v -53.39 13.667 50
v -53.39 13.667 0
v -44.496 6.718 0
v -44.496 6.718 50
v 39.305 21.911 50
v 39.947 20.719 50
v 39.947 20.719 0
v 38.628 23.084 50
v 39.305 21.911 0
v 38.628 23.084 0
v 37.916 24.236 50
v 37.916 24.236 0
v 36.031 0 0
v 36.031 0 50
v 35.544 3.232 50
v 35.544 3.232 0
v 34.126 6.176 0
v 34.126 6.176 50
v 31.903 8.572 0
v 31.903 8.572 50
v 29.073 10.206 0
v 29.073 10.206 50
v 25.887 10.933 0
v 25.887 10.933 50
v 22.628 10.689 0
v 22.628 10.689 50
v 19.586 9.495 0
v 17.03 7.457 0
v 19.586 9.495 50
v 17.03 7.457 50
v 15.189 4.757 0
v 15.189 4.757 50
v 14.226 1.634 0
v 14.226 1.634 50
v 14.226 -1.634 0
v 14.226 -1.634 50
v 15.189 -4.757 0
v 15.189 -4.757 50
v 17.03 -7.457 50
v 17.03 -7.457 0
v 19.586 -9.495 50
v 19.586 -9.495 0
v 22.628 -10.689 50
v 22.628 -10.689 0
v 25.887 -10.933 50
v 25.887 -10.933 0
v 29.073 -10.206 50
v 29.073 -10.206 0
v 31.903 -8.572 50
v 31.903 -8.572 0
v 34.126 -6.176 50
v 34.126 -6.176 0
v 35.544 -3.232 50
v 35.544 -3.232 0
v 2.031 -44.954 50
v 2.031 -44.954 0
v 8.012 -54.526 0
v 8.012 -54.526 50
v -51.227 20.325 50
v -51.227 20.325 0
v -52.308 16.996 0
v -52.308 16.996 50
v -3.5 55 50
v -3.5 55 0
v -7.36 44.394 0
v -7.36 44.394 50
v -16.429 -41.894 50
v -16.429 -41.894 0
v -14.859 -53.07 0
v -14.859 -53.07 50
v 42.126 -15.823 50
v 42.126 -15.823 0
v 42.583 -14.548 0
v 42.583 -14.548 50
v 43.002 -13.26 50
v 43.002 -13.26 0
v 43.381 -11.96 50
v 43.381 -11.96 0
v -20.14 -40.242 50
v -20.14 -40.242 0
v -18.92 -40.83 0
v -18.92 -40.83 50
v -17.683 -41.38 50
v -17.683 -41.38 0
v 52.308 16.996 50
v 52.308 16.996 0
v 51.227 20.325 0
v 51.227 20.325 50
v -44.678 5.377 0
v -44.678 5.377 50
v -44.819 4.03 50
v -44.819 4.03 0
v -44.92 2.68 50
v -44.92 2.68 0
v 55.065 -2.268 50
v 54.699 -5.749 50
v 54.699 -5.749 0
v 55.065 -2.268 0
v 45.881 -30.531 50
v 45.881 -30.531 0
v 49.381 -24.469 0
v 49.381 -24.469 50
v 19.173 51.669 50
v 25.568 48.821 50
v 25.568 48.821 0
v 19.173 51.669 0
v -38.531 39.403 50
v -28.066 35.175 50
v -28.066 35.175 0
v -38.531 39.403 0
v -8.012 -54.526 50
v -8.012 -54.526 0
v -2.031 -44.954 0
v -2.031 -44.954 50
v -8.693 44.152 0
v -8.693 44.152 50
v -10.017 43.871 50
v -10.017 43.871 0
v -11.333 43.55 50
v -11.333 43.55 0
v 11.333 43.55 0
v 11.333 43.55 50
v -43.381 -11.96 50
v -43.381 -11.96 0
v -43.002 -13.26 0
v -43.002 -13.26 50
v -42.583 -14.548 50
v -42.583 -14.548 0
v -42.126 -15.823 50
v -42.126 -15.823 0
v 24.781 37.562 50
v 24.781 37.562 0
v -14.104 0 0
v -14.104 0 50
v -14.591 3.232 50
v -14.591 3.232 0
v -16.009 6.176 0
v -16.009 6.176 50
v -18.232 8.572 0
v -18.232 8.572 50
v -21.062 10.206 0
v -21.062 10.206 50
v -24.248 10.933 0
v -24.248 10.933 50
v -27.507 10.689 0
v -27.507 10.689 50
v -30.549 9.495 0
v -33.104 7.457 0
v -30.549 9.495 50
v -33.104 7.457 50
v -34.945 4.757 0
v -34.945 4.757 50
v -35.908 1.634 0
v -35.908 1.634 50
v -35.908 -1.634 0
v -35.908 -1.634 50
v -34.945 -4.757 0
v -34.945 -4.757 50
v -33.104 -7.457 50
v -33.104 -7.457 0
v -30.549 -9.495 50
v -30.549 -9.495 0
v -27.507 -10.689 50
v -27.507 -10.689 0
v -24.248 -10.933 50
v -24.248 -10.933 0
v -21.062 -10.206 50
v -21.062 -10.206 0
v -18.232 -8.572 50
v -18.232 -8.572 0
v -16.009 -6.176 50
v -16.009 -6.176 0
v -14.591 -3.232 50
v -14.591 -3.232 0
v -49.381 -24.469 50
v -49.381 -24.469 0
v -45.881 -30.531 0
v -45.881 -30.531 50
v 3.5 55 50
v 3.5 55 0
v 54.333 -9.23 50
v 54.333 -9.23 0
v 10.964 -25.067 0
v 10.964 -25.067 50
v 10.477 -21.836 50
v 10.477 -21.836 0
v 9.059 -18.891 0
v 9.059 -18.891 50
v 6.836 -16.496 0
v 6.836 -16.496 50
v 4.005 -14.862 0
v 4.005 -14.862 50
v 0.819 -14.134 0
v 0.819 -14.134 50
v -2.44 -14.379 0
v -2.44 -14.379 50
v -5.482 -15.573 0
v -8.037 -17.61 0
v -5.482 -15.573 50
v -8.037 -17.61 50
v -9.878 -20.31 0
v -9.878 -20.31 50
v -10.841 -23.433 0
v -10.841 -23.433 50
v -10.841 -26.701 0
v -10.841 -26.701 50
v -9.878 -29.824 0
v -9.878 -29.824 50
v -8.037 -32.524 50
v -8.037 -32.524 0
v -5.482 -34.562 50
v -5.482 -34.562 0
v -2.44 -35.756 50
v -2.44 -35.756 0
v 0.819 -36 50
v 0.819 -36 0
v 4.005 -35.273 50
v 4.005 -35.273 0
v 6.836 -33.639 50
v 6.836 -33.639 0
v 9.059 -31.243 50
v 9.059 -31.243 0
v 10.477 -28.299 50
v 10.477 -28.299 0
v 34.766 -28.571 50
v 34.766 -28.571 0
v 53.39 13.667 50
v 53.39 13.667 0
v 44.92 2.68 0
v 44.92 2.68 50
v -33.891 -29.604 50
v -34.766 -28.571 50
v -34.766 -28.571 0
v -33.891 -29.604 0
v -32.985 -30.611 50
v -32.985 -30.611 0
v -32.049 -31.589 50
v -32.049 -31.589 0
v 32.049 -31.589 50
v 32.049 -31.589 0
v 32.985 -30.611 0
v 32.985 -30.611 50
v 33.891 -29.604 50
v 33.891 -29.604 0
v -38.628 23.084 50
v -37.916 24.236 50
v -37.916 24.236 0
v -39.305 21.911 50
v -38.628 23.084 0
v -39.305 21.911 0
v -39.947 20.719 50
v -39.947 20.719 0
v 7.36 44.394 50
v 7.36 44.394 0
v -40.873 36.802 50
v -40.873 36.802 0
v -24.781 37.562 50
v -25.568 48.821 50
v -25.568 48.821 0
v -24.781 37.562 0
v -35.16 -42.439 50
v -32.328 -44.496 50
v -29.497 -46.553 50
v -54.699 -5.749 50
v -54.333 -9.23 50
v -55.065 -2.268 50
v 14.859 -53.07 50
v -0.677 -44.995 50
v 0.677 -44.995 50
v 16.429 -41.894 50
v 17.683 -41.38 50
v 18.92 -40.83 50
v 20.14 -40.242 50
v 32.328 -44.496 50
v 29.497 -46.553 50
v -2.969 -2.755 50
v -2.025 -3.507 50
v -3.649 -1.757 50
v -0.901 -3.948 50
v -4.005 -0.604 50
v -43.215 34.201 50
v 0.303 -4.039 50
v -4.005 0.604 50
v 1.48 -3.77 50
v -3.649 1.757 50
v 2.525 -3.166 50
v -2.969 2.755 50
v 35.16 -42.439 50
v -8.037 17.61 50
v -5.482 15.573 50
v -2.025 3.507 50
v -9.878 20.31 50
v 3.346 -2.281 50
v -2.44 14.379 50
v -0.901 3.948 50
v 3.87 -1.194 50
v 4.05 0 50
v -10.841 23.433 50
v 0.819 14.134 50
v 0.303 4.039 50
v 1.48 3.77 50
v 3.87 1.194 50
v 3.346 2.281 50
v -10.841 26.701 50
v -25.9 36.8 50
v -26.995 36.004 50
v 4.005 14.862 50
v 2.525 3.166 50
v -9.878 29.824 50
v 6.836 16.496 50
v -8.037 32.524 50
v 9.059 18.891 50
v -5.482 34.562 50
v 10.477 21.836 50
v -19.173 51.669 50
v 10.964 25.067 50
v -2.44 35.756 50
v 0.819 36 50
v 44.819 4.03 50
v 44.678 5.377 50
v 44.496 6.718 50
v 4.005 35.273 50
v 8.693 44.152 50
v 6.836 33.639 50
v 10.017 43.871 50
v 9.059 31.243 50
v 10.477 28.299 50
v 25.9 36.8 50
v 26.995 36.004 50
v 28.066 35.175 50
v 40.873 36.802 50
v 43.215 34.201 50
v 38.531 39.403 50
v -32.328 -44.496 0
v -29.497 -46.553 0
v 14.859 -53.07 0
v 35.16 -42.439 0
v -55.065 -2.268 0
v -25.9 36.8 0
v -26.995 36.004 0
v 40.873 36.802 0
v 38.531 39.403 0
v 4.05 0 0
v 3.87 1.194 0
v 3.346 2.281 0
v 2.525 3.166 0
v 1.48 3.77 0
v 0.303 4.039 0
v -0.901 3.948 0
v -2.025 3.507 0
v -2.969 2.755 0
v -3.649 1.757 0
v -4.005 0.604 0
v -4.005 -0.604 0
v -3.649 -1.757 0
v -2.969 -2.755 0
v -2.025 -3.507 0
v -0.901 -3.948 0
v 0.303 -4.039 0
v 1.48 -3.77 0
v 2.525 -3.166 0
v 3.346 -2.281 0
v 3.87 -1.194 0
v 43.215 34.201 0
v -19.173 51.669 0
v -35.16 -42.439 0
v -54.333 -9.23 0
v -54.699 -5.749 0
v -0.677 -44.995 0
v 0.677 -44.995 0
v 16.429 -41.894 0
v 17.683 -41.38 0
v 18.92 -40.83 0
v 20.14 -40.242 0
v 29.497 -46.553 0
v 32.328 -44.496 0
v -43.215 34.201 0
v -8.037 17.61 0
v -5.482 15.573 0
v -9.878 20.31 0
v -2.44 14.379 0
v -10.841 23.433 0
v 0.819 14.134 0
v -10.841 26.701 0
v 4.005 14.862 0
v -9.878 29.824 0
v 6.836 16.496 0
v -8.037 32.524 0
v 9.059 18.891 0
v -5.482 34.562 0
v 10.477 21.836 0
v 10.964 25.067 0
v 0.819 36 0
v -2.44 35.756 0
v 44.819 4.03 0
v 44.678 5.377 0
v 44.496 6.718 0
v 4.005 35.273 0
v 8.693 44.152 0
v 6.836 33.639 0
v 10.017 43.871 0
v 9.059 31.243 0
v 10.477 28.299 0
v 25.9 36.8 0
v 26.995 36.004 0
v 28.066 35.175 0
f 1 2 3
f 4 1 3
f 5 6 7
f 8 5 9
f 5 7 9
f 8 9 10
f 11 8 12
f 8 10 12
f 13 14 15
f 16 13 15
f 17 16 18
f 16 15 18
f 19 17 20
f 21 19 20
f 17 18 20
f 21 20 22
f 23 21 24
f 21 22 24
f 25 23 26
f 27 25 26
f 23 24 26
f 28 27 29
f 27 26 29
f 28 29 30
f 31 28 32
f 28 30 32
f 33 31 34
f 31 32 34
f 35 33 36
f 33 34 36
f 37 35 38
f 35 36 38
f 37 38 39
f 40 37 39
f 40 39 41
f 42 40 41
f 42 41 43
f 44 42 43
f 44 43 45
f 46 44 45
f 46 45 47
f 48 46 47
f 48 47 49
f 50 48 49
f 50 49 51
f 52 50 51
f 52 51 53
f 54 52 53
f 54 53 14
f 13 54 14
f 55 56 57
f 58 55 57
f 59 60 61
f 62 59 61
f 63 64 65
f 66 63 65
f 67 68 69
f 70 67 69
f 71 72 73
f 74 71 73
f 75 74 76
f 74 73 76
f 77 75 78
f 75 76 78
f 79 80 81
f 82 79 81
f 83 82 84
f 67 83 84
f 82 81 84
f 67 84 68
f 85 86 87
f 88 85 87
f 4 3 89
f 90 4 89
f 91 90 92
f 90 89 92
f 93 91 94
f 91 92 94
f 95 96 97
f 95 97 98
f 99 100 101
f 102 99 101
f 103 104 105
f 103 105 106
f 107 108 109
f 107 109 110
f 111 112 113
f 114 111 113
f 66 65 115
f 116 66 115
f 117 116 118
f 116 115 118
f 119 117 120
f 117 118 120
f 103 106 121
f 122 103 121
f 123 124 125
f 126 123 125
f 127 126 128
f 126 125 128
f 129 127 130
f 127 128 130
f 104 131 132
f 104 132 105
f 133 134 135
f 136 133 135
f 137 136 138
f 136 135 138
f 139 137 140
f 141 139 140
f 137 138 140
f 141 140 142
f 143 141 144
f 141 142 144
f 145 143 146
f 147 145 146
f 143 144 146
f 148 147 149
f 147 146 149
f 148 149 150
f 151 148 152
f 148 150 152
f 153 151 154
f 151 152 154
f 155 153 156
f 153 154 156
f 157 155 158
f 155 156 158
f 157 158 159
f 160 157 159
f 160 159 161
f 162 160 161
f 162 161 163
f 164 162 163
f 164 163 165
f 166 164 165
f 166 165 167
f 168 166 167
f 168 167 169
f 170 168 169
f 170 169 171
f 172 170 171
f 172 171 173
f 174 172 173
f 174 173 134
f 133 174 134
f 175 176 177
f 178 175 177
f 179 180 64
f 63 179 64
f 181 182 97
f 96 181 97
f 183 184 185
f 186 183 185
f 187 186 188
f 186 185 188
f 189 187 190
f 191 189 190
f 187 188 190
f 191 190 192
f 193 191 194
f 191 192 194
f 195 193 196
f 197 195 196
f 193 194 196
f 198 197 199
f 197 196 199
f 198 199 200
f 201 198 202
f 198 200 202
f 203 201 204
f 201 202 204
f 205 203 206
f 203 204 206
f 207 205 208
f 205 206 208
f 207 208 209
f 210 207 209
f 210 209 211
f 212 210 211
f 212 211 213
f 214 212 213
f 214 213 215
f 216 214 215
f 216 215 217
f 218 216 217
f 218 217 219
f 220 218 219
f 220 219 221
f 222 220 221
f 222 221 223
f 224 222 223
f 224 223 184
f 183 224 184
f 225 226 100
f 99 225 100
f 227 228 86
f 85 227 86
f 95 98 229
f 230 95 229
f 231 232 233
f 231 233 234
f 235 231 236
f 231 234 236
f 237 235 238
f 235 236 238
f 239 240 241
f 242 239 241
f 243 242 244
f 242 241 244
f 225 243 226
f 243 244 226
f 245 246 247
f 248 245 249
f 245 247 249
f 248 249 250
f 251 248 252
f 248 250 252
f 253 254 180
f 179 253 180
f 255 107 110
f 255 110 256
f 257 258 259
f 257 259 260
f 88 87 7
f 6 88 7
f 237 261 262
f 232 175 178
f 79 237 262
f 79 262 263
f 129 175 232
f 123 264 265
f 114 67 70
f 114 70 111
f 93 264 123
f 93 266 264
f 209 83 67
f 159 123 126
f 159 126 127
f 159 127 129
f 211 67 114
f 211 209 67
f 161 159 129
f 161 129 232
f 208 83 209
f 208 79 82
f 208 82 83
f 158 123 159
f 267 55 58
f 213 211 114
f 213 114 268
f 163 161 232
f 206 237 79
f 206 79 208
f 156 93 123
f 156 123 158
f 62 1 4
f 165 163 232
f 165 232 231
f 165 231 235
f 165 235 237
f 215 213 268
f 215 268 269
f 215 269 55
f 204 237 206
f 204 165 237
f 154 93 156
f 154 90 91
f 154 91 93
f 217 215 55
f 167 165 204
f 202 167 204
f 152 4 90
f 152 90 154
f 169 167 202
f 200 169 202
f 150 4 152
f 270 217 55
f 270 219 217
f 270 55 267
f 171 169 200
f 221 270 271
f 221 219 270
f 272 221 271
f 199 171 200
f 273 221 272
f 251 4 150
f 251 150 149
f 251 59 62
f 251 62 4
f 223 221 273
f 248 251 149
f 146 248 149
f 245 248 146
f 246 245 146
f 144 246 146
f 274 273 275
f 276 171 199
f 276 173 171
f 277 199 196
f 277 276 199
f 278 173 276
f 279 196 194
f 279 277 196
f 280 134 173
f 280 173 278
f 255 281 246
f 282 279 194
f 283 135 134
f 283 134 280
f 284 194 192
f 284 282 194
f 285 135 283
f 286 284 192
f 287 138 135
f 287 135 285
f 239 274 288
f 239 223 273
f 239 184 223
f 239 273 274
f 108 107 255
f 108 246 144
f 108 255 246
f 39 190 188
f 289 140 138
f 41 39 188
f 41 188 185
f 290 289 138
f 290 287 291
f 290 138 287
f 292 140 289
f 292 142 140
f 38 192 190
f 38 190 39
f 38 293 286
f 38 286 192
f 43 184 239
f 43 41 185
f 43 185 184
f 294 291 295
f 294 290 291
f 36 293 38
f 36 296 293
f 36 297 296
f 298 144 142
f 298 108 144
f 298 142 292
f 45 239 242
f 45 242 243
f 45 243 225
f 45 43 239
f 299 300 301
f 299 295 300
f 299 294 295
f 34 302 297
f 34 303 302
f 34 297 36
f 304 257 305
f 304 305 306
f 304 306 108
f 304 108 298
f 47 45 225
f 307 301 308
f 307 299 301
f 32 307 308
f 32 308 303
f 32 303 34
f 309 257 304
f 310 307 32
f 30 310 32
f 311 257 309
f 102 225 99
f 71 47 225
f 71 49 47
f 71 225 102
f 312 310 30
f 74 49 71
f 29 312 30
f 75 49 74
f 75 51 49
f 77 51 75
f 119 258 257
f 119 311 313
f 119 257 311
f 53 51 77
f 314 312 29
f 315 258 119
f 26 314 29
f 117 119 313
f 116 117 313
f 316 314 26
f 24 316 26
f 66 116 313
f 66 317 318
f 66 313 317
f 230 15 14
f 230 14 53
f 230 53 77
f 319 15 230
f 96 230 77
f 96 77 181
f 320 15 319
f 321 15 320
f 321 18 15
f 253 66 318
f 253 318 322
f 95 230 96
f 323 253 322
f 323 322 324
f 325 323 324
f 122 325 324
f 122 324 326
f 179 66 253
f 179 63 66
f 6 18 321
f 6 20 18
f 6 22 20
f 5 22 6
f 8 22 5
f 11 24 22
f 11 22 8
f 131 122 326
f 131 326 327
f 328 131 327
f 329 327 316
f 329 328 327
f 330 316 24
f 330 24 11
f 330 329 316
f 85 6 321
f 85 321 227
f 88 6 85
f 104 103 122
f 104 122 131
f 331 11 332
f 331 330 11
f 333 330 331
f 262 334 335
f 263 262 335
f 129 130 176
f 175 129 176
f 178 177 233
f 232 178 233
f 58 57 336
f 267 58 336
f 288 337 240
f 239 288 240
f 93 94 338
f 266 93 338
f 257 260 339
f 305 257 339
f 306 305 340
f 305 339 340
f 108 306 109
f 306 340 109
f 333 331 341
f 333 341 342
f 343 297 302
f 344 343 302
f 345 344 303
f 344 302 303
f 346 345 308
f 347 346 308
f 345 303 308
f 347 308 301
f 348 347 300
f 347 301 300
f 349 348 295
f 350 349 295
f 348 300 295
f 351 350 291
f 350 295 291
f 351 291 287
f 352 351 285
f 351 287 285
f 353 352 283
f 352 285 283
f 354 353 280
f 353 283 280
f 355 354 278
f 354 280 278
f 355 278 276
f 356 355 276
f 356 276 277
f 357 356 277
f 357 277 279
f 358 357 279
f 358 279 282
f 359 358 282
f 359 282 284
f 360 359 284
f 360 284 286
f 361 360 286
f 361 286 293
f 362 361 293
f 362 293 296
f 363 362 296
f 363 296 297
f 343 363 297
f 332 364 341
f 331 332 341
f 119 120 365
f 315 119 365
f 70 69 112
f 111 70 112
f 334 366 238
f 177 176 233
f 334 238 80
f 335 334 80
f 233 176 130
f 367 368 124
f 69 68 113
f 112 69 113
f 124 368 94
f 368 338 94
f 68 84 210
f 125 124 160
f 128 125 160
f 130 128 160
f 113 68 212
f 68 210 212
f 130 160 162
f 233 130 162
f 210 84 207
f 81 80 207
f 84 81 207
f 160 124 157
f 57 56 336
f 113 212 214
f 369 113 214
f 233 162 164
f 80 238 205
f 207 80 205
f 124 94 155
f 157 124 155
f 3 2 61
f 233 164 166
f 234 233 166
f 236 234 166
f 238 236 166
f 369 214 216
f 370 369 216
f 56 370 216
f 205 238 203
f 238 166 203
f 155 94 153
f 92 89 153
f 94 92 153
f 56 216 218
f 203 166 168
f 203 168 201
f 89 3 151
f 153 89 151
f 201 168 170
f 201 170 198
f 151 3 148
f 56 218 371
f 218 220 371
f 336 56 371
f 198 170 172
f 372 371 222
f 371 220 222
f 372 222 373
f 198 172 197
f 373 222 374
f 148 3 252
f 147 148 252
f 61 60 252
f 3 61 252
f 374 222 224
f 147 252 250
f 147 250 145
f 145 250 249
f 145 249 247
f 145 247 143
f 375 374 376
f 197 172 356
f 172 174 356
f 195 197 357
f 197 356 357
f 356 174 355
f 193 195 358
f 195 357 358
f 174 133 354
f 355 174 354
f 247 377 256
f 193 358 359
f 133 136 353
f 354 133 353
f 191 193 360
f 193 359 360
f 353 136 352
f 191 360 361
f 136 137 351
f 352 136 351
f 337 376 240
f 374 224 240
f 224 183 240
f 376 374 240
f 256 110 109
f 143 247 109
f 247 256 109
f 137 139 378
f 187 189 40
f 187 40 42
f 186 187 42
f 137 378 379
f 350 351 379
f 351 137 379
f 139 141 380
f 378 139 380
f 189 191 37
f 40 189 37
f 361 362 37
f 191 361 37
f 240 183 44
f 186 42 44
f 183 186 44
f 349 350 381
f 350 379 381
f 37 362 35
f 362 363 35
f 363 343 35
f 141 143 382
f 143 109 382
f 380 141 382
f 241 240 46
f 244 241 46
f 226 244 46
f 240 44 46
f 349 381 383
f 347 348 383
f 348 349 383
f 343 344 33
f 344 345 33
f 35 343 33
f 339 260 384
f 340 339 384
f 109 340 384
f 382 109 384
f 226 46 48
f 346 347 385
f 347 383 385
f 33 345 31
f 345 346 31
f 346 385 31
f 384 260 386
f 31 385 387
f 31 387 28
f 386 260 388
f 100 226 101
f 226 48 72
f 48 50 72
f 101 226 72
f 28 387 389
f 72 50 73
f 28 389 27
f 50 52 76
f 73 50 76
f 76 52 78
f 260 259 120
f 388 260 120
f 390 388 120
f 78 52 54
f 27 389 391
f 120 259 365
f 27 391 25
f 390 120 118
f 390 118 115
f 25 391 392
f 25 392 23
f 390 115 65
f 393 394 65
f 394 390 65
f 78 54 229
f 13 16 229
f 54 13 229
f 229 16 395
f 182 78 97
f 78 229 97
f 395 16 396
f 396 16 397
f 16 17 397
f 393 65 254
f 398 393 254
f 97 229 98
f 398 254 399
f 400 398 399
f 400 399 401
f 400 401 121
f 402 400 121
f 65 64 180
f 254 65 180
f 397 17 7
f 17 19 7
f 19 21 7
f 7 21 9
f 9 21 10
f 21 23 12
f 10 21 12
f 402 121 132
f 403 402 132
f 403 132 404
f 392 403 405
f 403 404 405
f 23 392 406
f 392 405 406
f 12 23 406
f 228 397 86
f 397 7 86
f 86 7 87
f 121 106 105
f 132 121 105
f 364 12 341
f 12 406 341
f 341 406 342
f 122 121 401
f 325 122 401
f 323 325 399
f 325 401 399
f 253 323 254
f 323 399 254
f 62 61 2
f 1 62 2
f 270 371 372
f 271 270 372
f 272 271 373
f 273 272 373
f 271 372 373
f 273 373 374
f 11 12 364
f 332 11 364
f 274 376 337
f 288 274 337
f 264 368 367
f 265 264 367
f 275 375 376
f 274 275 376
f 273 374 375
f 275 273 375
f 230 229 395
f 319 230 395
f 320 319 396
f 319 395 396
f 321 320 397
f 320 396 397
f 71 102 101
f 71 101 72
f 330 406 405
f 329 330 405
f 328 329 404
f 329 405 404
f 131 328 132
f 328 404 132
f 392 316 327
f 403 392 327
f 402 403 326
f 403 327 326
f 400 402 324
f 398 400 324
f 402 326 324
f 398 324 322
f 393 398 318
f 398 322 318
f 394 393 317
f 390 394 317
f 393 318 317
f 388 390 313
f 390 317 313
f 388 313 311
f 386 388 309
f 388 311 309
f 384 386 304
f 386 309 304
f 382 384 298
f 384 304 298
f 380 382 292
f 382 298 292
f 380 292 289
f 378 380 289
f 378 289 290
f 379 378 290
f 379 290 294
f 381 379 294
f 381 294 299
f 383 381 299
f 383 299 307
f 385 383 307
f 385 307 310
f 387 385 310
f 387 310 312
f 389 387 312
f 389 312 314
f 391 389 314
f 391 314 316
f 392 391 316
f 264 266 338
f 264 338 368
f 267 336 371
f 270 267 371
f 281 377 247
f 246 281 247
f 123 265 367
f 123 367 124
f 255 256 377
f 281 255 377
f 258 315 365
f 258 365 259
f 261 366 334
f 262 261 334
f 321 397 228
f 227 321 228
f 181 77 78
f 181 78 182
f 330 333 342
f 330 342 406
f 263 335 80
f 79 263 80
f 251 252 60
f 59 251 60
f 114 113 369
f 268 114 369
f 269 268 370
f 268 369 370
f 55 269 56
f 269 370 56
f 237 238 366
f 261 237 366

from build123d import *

# Parameters (mm, degrees)
F0_R     = 4.05
F1_DEPTH = 50
F2_R     = 10.963605
F2_R_2   = 4.05
F3_DEPTH = 100


with BuildPart() as f1:
    # F0 (on Top) → F1 (new body)
    with BuildSketch(Plane.XY):
        with BuildLine():
            Line((14.85866, -53.070427), (16.429462, -41.893589))
            ThreePointArc((16.429462, -41.893589), (9.356026, -44.016642), (2.030598, -44.954162))
            Line((2.030598, -44.954162), (8.011626, -54.525809))
            Line((8.011626, -54.525809), (11.435143, -53.798118))
            Line((11.435143, -53.798118), (14.85866, -53.070427))
        make_face()
        with BuildLine():
            Line((-8.011626, -54.525809), (-2.030598, -44.954162))
            ThreePointArc((-2.030598, -44.954162), (-9.356026, -44.016642), (-16.429462, -41.893589))
            Line((-16.429462, -41.893589), (-14.85866, -53.070427))
            Line((-14.85866, -53.070427), (-11.435143, -53.798118))
            Line((-11.435143, -53.798118), (-8.011626, -54.525809))
        make_face()
        with BuildLine():
            Line((-29.496629, -46.553183), (-20.139548, -40.241752))
            ThreePointArc((-20.139548, -40.241752), (-26.450336, -36.405765), (-32.048718, -31.589234))
            Line((-32.048718, -31.589234), (-35.159748, -42.438686))
            Line((-35.159748, -42.438686), (-32.328189, -44.495935))
            Line((-32.328189, -44.495935), (-29.496629, -46.553183))
        make_face()
        with BuildLine():
            Line((-45.881397, -30.531089), (-34.766188, -28.571178))
            ThreePointArc((-34.766188, -28.571178), (-38.971143, -22.5), (-42.126459, -15.822813))
            Line((-42.126459, -15.822813), (-49.381397, -24.468911))
            Line((-49.381397, -24.468911), (-47.631397, -27.5))
            Line((-47.631397, -27.5), (-45.881397, -30.531089))
        make_face()
        with BuildLine():
            Line((-54.332855, -9.229892), (-43.381438, -11.960387))
            ThreePointArc((-43.381438, -11.960387), (-44.753485, -4.703781), (-44.920154, 2.679516))
            Line((-44.920154, 2.679516), (-55.064554, -2.268239))
            Line((-55.064554, -2.268239), (-54.698704, -5.749065))
            Line((-54.698704, -5.749065), (-54.332855, -9.229892))
        make_face()
        with BuildLine():
            ThreePointArc((-37.916147, 24.23563), (-33.441517, 30.110877), (-28.066181, 35.175126))
            Line((-28.066181, 35.175126), (-38.531008, 39.40319))
            Line((-38.531008, 39.40319), (-40.872965, 36.802183))
            Line((-40.872965, 36.802183), (-43.214923, 34.201176))
            Line((-43.214923, 34.201176), (-37.916147, 24.23563))
        make_face()
        with BuildLine():
            ThreePointArc((-44.495643, 6.718463), (-42.797543, 13.905765), (-39.946745, 20.718532))
            Line((-39.946745, 20.718532), (-51.226549, 20.324632))
            Line((-51.226549, 20.324632), (-52.308108, 16.995935))
            Line((-52.308108, 16.995935), (-53.389668, 13.667237))
            Line((-53.389668, 13.667237), (-44.495643, 6.718463))
        make_face()
        with BuildLine():
            ThreePointArc((-24.780606, 37.562236), (-18.303149, 41.109546), (-11.33272, 43.549621))
            Line((-11.33272, 43.549621), (-19.173106, 51.668578))
            Line((-19.173106, 51.668578), (-22.370515, 50.245))
            Line((-22.370515, 50.245), (-25.567924, 48.821422))
            Line((-25.567924, 48.821422), (-24.780606, 37.562236))
        make_face()
        with BuildLine():
            ThreePointArc((-7.360272, 44.393991), (0, 45), (7.360272, 44.393991))
            Line((7.360272, 44.393991), (3.5, 55))
            Line((3.5, 55), (0, 55))
            Line((0, 55), (-3.5, 55))
            Line((-3.5, 55), (-7.360272, 44.393991))
        make_face()
        with BuildLine():
            ThreePointArc((11.33272, 43.549621), (18.303149, 41.109546), (24.780606, 37.562236))
            Line((24.780606, 37.562236), (25.567924, 48.821422))
            Line((25.567924, 48.821422), (22.370515, 50.245))
            Line((22.370515, 50.245), (19.173106, 51.668578))
            Line((19.173106, 51.668578), (11.33272, 43.549621))
        make_face()
        with BuildLine():
            ThreePointArc((28.066181, 35.175126), (33.441517, 30.110877), (37.916147, 24.23563))
            Line((37.916147, 24.23563), (43.214923, 34.201176))
            Line((43.214923, 34.201176), (40.872965, 36.802183))
            Line((40.872965, 36.802183), (38.531008, 39.40319))
            Line((38.531008, 39.40319), (28.066181, 35.175126))
        make_face()
        with BuildLine():
            ThreePointArc((39.946745, 20.718532), (42.797543, 13.905765), (44.495643, 6.718463))
            Line((44.495643, 6.718463), (53.389668, 13.667237))
            Line((53.389668, 13.667237), (52.308108, 16.995935))
            Line((52.308108, 16.995935), (51.226549, 20.324632))
            Line((51.226549, 20.324632), (39.946745, 20.718532))
        make_face()
        with BuildLine():
            Line((49.381397, -24.468911), (42.126459, -15.822813))
            ThreePointArc((42.126459, -15.822813), (38.971143, -22.5), (34.766188, -28.571178))
            Line((34.766188, -28.571178), (45.881397, -30.531089))
            Line((45.881397, -30.531089), (47.631397, -27.5))
            Line((47.631397, -27.5), (49.381397, -24.468911))
        make_face()
        with BuildLine():
            ThreePointArc((43.381438, -11.960387), (44.593524, -6.034704), (45, 0))
            ThreePointArc((45, 0), (44.980034, 1.340353), (44.920154, 2.679516))
            ThreePointArc((44.920154, 2.679516), (44.753485, 4.703781), (44.495643, 6.718463))
            ThreePointArc((44.495643, 6.718463), (42.797543, 13.905765), (39.946745, 20.718532))
            ThreePointArc((39.946745, 20.718532), (38.971143, 22.5), (37.916147, 24.23563))
            ThreePointArc((37.916147, 24.23563), (33.441517, 30.110877), (28.066181, 35.175126))
            ThreePointArc((28.066181, 35.175126), (26.450336, 36.405765), (24.780606, 37.562236))
            ThreePointArc((24.780606, 37.562236), (18.303149, 41.109546), (11.33272, 43.549621))
            ThreePointArc((11.33272, 43.549621), (9.356026, 44.016642), (7.360272, 44.393991))
            ThreePointArc((7.360272, 44.393991), (0, 45), (-7.360272, 44.393991))
            ThreePointArc((-7.360272, 44.393991), (-9.356026, 44.016642), (-11.33272, 43.549621))
            ThreePointArc((-11.33272, 43.549621), (-18.303149, 41.109546), (-24.780606, 37.562236))
            ThreePointArc((-24.780606, 37.562236), (-26.450336, 36.405765), (-28.066181, 35.175126))
            ThreePointArc((-28.066181, 35.175126), (-33.441517, 30.110877), (-37.916147, 24.23563))
            ThreePointArc((-37.916147, 24.23563), (-38.971143, 22.5), (-39.946745, 20.718532))
            ThreePointArc((-39.946745, 20.718532), (-42.797543, 13.905765), (-44.495643, 6.718463))
            ThreePointArc((-44.495643, 6.718463), (-44.753485, 4.703781), (-44.920154, 2.679516))
            ThreePointArc((-44.920154, 2.679516), (-44.753485, -4.703781), (-43.381438, -11.960387))
            ThreePointArc((-43.381438, -11.960387), (-42.797543, -13.905765), (-42.126459, -15.822813))
            ThreePointArc((-42.126459, -15.822813), (-38.971143, -22.5), (-34.766188, -28.571178))
            ThreePointArc((-34.766188, -28.571178), (-33.441517, -30.110877), (-32.048718, -31.589234))
            ThreePointArc((-32.048718, -31.589234), (-26.450336, -36.405765), (-20.139548, -40.241752))
            ThreePointArc((-20.139548, -40.241752), (-18.303149, -41.109546), (-16.429462, -41.893589))
            ThreePointArc((-16.429462, -41.893589), (-9.356026, -44.016642), (-2.030598, -44.954162))
            ThreePointArc((-2.030598, -44.954162), (0, -45), (2.030598, -44.954162))
            ThreePointArc((2.030598, -44.954162), (9.356026, -44.016642), (16.429462, -41.893589))
            ThreePointArc((16.429462, -41.893589), (18.303149, -41.109546), (20.139548, -40.241752))
            ThreePointArc((20.139548, -40.241752), (26.450336, -36.405765), (32.048718, -31.589234))
            ThreePointArc((32.048718, -31.589234), (33.441517, -30.110877), (34.766188, -28.571178))
            ThreePointArc((34.766188, -28.571178), (38.971143, -22.5), (42.126459, -15.822813))
            ThreePointArc((42.126459, -15.822813), (42.797543, -13.905765), (43.381438, -11.960387))
        make_face()
        Circle(F0_R, mode=Mode.SUBTRACT)
        with BuildLine():
            Line((35.159748, -42.438686), (32.048718, -31.589234))
            ThreePointArc((32.048718, -31.589234), (26.450336, -36.405765), (20.139548, -40.241752))
            Line((20.139548, -40.241752), (29.496629, -46.553183))
            Line((29.496629, -46.553183), (32.328189, -44.495935))
            Line((32.328189, -44.495935), (35.159748, -42.438686))
        make_face()
        with BuildLine():
            ThreePointArc((44.920154, 2.679516), (44.980034, 1.340353), (45, 0))
            ThreePointArc((45, 0), (44.593524, -6.034704), (43.381438, -11.960387))
            Line((43.381438, -11.960387), (54.332855, -9.229892))
            Line((54.332855, -9.229892), (54.698704, -5.749065))
            Line((54.698704, -5.749065), (55.064554, -2.268239))
            Line((55.064554, -2.268239), (44.920154, 2.679516))
        make_face()
        Circle(F0_R)
    extrude(amount=F1_DEPTH)

    # F2 (on face) → F3 (cut)
    with BuildSketch(Plane.XY.offset(50)):
        with Locations((0, 25.067315)):
            Circle(F2_R)
        with Locations((-25.067315, 0)):
            Circle(F2_R)
        with Locations((25.067315, 0)):
            Circle(F2_R)
        Circle(F2_R_2)
        with Locations((0, -25.067315)):
            Circle(F2_R)
    extrude(amount=-F3_DEPTH, mode=Mode.SUBTRACT)


solid = f1.part
